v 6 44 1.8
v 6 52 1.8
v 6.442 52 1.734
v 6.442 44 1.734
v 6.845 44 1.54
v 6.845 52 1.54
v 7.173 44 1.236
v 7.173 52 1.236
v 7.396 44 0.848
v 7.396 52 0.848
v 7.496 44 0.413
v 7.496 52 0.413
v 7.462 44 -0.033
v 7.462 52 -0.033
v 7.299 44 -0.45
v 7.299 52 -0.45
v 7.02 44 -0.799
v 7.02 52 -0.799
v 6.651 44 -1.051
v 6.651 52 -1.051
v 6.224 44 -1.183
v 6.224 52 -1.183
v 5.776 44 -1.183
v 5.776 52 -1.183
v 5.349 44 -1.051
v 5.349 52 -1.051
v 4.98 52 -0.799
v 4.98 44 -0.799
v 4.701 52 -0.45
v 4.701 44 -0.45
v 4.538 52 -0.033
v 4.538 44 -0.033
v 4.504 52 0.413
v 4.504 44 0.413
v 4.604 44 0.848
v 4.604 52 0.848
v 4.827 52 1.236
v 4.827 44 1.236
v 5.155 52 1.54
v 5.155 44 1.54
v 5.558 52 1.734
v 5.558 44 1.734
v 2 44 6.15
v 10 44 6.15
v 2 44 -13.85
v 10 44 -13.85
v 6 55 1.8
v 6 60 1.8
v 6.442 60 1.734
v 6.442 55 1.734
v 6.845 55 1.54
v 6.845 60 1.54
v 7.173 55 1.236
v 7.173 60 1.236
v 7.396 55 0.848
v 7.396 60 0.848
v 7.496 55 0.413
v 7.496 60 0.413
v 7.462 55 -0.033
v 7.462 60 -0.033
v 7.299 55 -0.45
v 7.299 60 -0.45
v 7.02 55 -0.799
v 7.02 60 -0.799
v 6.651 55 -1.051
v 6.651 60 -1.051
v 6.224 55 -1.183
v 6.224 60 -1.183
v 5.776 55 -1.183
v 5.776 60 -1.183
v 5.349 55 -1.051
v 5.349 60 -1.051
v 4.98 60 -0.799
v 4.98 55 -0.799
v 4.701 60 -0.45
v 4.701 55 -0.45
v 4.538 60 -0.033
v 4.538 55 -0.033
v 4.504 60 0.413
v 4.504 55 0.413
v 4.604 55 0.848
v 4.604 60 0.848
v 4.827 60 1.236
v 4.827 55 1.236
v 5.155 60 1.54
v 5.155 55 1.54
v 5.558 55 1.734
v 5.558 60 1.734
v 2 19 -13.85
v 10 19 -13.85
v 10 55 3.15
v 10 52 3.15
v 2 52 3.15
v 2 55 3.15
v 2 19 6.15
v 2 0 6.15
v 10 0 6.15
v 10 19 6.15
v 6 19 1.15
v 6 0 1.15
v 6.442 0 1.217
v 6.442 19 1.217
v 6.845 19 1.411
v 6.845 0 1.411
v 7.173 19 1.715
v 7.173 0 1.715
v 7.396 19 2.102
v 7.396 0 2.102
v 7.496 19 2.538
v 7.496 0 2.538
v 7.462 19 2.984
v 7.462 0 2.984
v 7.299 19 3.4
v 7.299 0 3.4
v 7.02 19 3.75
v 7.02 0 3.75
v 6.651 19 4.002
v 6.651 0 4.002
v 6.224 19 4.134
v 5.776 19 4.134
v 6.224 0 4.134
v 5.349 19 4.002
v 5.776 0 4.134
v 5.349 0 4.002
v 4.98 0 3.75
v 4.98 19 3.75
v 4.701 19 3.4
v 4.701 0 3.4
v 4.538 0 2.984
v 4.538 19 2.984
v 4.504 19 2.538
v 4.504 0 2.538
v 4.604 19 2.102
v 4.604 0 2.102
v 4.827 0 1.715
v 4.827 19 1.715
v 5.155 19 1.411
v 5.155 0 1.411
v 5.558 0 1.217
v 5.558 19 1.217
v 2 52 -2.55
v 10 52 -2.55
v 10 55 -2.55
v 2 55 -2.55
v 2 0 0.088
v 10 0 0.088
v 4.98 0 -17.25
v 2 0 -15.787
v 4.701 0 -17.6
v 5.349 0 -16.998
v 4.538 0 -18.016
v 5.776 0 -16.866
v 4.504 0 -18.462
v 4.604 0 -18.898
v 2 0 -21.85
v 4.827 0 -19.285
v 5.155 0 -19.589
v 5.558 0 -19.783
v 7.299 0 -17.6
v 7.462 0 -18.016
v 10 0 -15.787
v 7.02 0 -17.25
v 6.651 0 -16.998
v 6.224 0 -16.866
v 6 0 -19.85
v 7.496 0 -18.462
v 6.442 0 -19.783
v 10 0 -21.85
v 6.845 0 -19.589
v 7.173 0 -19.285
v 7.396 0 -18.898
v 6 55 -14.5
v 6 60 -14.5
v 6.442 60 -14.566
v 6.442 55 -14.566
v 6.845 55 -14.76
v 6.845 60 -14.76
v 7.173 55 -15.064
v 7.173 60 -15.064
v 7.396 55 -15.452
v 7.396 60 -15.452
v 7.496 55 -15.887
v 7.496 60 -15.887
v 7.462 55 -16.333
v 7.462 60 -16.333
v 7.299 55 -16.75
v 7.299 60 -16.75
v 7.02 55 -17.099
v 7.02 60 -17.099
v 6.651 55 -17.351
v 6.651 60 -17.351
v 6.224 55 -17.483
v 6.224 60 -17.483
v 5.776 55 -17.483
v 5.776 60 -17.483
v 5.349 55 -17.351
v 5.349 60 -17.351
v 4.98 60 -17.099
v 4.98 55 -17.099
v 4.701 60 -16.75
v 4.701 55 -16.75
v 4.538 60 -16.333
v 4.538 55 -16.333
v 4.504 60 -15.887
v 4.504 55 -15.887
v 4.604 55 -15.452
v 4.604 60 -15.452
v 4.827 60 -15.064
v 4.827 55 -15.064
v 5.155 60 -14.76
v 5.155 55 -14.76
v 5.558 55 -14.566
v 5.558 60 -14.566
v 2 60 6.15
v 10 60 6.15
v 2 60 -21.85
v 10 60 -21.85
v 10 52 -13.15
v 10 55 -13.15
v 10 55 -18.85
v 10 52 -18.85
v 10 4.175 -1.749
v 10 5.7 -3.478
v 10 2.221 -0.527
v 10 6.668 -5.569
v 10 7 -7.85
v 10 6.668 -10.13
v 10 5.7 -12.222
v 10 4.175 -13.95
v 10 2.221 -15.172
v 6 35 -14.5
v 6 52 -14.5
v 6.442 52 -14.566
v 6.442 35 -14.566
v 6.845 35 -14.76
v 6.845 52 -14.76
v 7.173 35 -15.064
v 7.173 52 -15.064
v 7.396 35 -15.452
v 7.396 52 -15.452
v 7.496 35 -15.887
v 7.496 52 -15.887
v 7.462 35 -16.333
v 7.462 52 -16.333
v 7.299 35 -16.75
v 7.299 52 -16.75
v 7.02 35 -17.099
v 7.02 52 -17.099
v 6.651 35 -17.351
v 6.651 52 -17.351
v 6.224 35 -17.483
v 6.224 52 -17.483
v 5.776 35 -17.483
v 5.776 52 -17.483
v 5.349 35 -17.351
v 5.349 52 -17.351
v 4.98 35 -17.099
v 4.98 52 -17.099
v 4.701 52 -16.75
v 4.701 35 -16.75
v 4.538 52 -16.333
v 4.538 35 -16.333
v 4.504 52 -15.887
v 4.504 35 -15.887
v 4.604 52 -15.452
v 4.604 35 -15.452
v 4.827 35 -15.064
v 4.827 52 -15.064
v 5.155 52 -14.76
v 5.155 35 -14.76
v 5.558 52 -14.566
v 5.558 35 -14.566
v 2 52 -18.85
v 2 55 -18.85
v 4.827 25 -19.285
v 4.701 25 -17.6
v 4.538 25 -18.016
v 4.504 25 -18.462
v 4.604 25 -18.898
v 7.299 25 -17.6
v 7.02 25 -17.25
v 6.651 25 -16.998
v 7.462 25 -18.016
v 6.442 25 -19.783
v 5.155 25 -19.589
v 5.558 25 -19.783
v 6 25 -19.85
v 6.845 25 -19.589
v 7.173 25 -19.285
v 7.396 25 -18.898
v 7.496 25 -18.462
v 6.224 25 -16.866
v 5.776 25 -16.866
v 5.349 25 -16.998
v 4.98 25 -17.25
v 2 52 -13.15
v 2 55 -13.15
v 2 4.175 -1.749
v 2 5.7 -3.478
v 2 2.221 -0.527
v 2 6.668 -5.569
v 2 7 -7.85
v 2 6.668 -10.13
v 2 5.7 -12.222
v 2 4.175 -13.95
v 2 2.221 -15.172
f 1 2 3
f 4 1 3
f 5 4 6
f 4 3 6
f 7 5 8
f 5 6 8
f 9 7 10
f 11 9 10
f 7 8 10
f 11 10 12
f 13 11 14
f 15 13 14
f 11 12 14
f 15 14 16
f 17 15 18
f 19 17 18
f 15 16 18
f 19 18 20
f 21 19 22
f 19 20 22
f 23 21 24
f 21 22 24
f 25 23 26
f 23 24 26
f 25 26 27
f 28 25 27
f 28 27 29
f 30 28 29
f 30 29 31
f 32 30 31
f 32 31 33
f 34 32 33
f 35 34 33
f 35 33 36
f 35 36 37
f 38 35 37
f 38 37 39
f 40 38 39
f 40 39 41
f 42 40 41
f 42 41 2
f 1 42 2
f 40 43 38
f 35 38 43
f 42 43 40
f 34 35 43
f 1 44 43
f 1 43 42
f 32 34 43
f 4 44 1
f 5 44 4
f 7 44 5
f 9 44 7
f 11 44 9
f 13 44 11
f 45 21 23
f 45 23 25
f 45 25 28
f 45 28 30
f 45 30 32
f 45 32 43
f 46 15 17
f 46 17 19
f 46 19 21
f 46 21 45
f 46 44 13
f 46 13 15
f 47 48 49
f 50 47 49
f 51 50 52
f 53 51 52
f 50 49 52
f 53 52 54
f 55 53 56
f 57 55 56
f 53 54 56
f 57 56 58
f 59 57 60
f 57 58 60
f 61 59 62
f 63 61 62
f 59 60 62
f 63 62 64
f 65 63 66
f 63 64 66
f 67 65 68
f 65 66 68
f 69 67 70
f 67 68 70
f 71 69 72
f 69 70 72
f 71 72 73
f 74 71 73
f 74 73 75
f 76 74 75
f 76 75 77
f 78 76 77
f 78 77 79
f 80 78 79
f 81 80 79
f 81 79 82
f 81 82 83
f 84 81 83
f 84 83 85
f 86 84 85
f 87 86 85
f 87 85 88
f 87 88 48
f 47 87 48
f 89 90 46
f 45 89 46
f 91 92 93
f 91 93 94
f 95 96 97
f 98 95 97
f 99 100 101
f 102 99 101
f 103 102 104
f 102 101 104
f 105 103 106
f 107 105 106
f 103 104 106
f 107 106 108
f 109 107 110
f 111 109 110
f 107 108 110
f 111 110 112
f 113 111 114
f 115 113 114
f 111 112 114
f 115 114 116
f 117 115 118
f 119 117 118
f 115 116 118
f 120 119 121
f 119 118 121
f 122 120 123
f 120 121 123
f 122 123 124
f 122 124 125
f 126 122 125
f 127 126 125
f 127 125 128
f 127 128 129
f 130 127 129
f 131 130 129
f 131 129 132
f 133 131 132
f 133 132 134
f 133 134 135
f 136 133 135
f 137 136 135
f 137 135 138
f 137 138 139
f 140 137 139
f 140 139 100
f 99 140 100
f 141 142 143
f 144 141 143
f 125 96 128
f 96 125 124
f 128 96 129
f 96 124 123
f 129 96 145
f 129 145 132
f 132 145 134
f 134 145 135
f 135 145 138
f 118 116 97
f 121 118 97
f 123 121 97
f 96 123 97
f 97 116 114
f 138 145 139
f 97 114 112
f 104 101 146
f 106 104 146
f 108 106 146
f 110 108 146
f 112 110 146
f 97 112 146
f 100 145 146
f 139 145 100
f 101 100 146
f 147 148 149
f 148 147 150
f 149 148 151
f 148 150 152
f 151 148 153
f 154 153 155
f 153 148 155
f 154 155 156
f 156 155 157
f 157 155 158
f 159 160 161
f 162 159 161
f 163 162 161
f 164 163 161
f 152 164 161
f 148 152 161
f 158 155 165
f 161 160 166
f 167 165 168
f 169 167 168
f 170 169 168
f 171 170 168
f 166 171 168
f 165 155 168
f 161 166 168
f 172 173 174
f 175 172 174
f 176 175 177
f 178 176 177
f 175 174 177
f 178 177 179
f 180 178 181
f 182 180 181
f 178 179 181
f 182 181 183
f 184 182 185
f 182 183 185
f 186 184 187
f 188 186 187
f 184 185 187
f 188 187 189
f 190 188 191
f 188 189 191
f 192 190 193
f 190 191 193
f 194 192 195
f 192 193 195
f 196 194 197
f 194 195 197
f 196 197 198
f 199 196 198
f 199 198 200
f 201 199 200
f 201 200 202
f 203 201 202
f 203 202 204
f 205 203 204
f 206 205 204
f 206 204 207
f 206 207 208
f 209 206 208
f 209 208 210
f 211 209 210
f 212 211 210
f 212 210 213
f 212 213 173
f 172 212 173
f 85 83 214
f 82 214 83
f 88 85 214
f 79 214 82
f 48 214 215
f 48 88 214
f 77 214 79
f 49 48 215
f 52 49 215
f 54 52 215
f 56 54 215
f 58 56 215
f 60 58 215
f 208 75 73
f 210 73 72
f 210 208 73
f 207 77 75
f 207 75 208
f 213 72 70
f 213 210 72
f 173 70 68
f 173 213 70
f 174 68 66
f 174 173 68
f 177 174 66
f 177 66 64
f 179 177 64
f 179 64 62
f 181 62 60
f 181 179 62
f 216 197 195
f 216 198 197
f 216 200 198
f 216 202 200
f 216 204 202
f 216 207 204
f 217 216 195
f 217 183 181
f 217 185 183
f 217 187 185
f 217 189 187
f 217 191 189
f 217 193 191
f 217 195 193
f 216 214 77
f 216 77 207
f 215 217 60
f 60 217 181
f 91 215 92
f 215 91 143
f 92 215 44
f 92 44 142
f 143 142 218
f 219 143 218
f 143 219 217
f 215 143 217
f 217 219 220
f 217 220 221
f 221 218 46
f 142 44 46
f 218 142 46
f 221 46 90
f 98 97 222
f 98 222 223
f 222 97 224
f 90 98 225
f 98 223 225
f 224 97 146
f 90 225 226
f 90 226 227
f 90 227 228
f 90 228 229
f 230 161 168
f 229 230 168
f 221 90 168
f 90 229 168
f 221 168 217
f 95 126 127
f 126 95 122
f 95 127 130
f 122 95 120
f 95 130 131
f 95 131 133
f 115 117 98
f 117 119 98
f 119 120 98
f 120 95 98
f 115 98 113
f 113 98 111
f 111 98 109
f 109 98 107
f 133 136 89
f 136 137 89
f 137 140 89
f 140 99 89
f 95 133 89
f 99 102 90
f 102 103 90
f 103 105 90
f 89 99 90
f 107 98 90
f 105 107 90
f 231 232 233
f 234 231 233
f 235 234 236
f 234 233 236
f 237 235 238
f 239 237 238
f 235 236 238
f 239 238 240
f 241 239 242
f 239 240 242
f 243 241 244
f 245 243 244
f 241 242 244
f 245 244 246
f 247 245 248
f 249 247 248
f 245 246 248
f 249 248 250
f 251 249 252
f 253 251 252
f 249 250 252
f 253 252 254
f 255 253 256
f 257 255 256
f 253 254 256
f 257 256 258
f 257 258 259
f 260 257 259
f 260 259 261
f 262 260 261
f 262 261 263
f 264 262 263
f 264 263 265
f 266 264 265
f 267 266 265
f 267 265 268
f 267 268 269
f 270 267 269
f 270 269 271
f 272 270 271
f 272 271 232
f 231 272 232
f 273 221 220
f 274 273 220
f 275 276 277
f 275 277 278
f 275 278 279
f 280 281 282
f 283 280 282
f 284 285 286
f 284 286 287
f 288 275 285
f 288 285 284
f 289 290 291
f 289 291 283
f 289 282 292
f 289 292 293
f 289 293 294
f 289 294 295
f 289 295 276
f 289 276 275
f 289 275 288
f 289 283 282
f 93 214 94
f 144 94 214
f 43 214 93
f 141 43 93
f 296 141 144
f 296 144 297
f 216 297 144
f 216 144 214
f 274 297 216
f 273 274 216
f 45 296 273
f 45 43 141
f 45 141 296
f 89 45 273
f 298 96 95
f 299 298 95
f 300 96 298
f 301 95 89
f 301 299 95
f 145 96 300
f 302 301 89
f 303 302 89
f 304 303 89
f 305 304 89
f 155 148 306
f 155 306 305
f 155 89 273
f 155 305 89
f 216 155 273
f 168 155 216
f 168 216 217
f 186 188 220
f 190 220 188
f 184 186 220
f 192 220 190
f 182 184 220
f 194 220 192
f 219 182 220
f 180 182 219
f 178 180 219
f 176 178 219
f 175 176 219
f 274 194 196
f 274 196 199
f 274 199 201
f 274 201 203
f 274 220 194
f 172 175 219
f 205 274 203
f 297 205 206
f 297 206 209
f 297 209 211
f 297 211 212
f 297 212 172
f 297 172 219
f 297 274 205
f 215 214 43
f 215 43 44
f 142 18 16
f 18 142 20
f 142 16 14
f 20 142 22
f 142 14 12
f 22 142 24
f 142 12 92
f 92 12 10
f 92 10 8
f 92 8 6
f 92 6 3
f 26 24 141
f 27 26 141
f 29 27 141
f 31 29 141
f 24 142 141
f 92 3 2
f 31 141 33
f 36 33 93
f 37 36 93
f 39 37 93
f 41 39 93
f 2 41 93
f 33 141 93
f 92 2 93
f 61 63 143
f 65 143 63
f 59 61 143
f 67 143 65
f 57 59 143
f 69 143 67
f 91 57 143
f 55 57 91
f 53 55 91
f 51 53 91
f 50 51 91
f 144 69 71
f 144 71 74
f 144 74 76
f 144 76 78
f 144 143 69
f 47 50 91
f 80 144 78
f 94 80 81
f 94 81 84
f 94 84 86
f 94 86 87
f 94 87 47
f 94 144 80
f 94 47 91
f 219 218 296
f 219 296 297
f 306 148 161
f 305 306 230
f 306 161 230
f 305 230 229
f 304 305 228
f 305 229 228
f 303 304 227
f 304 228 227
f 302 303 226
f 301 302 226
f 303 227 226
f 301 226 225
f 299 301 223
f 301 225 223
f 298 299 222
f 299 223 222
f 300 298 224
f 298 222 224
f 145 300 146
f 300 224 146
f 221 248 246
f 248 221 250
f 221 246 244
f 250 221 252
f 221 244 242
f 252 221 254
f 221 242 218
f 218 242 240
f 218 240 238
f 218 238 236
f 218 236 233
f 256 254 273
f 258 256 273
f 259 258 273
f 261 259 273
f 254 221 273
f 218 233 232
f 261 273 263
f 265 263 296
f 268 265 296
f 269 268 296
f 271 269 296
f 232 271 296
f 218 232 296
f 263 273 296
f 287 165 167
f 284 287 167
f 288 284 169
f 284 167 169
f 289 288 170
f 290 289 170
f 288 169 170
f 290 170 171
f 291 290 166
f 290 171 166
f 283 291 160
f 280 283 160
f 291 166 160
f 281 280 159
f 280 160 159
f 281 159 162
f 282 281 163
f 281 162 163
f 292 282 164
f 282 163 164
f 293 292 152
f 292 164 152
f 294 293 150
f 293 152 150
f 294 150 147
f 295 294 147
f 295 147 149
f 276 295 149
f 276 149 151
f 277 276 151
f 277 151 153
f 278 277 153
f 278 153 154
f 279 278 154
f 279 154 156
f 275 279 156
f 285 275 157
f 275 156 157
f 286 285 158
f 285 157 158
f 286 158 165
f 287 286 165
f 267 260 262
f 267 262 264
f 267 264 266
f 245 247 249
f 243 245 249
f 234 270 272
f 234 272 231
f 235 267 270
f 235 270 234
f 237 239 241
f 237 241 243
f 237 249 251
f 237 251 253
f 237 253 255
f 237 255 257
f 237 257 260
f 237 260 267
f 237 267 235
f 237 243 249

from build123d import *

# Parameters (mm, degrees)
SKETCH1_W           = 8
SKETCH1_H           = 28
BOSS_EXTRUDE2_DEPTH = 60
CUT_EXTRUDE2_DEPTH  = 65.353734654
SKETCH6_R           = 1.5
CUT_EXTRUDE3_DEPTH  = 25
SKETCH7_W           = 5.7
SKETCH7_H           = 3
CUT_EXTRUDE4_DEPTH  = 65.353734654
SKETCH8_R           = 1.5
CUT_EXTRUDE5_DEPTH  = 25
SKETCH9_W           = 20
SKETCH9_H           = 25
CUT_EXTRUDE6_DEPTH  = 65.353734654


with BuildPart() as part:
    # Sketch1 → Boss-Extrude2 (new body)
    with BuildSketch(Plane(origin=(0, 0, 0), x_dir=(1, 0, 0), z_dir=(0, 1, 0))):
        with Locations((6, 7.849557522)):
            Rectangle(SKETCH1_W, SKETCH1_H)
    extrude(amount=BOSS_EXTRUDE2_DEPTH)

    # Sketch5 → Cut-Extrude2 (cut, through all)
    with BuildSketch(Plane(origin=(10, 0, 0), x_dir=(0, 0, -1), z_dir=(1, 0, 0))):
        with BuildLine():
            Line((-0.087696411, 0), (15.786811455, 0))
            ThreePointArc((15.786811455, 0), (7.849557522, 7), (-0.087696411, 0))
        make_face()
    extrude(amount=-CUT_EXTRUDE2_DEPTH, mode=Mode.SUBTRACT)

    # Sketch6 → Cut-Extrude3 (cut)
    with BuildSketch(Plane.XZ):
        with Locations(Location((6, -18.349557522, 0), (0, 0, 270))):
            Circle(SKETCH6_R)
        with Locations(Location((6, 2.650442478, 0), (0, 0, 270))):
            Circle(SKETCH6_R)
    extrude(amount=-CUT_EXTRUDE3_DEPTH, mode=Mode.SUBTRACT)

    # Sketch7 → Cut-Extrude4 (cut, through all)
    with BuildSketch(Plane.ZY.offset(-2)):
        with Locations((-15.999557522, 53.5)):
            Rectangle(SKETCH7_W, SKETCH7_H)
        with Locations((0.300442478, 53.5)):
            Rectangle(SKETCH7_W, SKETCH7_H)
    extrude(amount=-CUT_EXTRUDE4_DEPTH, mode=Mode.SUBTRACT)

    # Sketch8 → Cut-Extrude5 (cut)
    with BuildSketch(Plane(origin=(0, 60, 0), x_dir=(1, 0, 0), z_dir=(0, 1, 0))):
        with Locations(Location((6, 15.999557522, 0), (0, 0, 270))):
            Circle(SKETCH8_R)
        with Locations(Location((6, -0.300442478, 0), (0, 0, 270))):
            Circle(SKETCH8_R)
    extrude(amount=-CUT_EXTRUDE5_DEPTH, mode=Mode.SUBTRACT)

    # Sketch9 → Cut-Extrude6 (cut, through all)
    with BuildSketch(Plane(origin=(10, 0, 0), x_dir=(0, 0, -1), z_dir=(1, 0, 0))):
        with Locations((3.849557522, 31.5)):
            Rectangle(SKETCH9_W, SKETCH9_H)
    extrude(amount=-CUT_EXTRUDE6_DEPTH, mode=Mode.SUBTRACT)


solid = part.part
